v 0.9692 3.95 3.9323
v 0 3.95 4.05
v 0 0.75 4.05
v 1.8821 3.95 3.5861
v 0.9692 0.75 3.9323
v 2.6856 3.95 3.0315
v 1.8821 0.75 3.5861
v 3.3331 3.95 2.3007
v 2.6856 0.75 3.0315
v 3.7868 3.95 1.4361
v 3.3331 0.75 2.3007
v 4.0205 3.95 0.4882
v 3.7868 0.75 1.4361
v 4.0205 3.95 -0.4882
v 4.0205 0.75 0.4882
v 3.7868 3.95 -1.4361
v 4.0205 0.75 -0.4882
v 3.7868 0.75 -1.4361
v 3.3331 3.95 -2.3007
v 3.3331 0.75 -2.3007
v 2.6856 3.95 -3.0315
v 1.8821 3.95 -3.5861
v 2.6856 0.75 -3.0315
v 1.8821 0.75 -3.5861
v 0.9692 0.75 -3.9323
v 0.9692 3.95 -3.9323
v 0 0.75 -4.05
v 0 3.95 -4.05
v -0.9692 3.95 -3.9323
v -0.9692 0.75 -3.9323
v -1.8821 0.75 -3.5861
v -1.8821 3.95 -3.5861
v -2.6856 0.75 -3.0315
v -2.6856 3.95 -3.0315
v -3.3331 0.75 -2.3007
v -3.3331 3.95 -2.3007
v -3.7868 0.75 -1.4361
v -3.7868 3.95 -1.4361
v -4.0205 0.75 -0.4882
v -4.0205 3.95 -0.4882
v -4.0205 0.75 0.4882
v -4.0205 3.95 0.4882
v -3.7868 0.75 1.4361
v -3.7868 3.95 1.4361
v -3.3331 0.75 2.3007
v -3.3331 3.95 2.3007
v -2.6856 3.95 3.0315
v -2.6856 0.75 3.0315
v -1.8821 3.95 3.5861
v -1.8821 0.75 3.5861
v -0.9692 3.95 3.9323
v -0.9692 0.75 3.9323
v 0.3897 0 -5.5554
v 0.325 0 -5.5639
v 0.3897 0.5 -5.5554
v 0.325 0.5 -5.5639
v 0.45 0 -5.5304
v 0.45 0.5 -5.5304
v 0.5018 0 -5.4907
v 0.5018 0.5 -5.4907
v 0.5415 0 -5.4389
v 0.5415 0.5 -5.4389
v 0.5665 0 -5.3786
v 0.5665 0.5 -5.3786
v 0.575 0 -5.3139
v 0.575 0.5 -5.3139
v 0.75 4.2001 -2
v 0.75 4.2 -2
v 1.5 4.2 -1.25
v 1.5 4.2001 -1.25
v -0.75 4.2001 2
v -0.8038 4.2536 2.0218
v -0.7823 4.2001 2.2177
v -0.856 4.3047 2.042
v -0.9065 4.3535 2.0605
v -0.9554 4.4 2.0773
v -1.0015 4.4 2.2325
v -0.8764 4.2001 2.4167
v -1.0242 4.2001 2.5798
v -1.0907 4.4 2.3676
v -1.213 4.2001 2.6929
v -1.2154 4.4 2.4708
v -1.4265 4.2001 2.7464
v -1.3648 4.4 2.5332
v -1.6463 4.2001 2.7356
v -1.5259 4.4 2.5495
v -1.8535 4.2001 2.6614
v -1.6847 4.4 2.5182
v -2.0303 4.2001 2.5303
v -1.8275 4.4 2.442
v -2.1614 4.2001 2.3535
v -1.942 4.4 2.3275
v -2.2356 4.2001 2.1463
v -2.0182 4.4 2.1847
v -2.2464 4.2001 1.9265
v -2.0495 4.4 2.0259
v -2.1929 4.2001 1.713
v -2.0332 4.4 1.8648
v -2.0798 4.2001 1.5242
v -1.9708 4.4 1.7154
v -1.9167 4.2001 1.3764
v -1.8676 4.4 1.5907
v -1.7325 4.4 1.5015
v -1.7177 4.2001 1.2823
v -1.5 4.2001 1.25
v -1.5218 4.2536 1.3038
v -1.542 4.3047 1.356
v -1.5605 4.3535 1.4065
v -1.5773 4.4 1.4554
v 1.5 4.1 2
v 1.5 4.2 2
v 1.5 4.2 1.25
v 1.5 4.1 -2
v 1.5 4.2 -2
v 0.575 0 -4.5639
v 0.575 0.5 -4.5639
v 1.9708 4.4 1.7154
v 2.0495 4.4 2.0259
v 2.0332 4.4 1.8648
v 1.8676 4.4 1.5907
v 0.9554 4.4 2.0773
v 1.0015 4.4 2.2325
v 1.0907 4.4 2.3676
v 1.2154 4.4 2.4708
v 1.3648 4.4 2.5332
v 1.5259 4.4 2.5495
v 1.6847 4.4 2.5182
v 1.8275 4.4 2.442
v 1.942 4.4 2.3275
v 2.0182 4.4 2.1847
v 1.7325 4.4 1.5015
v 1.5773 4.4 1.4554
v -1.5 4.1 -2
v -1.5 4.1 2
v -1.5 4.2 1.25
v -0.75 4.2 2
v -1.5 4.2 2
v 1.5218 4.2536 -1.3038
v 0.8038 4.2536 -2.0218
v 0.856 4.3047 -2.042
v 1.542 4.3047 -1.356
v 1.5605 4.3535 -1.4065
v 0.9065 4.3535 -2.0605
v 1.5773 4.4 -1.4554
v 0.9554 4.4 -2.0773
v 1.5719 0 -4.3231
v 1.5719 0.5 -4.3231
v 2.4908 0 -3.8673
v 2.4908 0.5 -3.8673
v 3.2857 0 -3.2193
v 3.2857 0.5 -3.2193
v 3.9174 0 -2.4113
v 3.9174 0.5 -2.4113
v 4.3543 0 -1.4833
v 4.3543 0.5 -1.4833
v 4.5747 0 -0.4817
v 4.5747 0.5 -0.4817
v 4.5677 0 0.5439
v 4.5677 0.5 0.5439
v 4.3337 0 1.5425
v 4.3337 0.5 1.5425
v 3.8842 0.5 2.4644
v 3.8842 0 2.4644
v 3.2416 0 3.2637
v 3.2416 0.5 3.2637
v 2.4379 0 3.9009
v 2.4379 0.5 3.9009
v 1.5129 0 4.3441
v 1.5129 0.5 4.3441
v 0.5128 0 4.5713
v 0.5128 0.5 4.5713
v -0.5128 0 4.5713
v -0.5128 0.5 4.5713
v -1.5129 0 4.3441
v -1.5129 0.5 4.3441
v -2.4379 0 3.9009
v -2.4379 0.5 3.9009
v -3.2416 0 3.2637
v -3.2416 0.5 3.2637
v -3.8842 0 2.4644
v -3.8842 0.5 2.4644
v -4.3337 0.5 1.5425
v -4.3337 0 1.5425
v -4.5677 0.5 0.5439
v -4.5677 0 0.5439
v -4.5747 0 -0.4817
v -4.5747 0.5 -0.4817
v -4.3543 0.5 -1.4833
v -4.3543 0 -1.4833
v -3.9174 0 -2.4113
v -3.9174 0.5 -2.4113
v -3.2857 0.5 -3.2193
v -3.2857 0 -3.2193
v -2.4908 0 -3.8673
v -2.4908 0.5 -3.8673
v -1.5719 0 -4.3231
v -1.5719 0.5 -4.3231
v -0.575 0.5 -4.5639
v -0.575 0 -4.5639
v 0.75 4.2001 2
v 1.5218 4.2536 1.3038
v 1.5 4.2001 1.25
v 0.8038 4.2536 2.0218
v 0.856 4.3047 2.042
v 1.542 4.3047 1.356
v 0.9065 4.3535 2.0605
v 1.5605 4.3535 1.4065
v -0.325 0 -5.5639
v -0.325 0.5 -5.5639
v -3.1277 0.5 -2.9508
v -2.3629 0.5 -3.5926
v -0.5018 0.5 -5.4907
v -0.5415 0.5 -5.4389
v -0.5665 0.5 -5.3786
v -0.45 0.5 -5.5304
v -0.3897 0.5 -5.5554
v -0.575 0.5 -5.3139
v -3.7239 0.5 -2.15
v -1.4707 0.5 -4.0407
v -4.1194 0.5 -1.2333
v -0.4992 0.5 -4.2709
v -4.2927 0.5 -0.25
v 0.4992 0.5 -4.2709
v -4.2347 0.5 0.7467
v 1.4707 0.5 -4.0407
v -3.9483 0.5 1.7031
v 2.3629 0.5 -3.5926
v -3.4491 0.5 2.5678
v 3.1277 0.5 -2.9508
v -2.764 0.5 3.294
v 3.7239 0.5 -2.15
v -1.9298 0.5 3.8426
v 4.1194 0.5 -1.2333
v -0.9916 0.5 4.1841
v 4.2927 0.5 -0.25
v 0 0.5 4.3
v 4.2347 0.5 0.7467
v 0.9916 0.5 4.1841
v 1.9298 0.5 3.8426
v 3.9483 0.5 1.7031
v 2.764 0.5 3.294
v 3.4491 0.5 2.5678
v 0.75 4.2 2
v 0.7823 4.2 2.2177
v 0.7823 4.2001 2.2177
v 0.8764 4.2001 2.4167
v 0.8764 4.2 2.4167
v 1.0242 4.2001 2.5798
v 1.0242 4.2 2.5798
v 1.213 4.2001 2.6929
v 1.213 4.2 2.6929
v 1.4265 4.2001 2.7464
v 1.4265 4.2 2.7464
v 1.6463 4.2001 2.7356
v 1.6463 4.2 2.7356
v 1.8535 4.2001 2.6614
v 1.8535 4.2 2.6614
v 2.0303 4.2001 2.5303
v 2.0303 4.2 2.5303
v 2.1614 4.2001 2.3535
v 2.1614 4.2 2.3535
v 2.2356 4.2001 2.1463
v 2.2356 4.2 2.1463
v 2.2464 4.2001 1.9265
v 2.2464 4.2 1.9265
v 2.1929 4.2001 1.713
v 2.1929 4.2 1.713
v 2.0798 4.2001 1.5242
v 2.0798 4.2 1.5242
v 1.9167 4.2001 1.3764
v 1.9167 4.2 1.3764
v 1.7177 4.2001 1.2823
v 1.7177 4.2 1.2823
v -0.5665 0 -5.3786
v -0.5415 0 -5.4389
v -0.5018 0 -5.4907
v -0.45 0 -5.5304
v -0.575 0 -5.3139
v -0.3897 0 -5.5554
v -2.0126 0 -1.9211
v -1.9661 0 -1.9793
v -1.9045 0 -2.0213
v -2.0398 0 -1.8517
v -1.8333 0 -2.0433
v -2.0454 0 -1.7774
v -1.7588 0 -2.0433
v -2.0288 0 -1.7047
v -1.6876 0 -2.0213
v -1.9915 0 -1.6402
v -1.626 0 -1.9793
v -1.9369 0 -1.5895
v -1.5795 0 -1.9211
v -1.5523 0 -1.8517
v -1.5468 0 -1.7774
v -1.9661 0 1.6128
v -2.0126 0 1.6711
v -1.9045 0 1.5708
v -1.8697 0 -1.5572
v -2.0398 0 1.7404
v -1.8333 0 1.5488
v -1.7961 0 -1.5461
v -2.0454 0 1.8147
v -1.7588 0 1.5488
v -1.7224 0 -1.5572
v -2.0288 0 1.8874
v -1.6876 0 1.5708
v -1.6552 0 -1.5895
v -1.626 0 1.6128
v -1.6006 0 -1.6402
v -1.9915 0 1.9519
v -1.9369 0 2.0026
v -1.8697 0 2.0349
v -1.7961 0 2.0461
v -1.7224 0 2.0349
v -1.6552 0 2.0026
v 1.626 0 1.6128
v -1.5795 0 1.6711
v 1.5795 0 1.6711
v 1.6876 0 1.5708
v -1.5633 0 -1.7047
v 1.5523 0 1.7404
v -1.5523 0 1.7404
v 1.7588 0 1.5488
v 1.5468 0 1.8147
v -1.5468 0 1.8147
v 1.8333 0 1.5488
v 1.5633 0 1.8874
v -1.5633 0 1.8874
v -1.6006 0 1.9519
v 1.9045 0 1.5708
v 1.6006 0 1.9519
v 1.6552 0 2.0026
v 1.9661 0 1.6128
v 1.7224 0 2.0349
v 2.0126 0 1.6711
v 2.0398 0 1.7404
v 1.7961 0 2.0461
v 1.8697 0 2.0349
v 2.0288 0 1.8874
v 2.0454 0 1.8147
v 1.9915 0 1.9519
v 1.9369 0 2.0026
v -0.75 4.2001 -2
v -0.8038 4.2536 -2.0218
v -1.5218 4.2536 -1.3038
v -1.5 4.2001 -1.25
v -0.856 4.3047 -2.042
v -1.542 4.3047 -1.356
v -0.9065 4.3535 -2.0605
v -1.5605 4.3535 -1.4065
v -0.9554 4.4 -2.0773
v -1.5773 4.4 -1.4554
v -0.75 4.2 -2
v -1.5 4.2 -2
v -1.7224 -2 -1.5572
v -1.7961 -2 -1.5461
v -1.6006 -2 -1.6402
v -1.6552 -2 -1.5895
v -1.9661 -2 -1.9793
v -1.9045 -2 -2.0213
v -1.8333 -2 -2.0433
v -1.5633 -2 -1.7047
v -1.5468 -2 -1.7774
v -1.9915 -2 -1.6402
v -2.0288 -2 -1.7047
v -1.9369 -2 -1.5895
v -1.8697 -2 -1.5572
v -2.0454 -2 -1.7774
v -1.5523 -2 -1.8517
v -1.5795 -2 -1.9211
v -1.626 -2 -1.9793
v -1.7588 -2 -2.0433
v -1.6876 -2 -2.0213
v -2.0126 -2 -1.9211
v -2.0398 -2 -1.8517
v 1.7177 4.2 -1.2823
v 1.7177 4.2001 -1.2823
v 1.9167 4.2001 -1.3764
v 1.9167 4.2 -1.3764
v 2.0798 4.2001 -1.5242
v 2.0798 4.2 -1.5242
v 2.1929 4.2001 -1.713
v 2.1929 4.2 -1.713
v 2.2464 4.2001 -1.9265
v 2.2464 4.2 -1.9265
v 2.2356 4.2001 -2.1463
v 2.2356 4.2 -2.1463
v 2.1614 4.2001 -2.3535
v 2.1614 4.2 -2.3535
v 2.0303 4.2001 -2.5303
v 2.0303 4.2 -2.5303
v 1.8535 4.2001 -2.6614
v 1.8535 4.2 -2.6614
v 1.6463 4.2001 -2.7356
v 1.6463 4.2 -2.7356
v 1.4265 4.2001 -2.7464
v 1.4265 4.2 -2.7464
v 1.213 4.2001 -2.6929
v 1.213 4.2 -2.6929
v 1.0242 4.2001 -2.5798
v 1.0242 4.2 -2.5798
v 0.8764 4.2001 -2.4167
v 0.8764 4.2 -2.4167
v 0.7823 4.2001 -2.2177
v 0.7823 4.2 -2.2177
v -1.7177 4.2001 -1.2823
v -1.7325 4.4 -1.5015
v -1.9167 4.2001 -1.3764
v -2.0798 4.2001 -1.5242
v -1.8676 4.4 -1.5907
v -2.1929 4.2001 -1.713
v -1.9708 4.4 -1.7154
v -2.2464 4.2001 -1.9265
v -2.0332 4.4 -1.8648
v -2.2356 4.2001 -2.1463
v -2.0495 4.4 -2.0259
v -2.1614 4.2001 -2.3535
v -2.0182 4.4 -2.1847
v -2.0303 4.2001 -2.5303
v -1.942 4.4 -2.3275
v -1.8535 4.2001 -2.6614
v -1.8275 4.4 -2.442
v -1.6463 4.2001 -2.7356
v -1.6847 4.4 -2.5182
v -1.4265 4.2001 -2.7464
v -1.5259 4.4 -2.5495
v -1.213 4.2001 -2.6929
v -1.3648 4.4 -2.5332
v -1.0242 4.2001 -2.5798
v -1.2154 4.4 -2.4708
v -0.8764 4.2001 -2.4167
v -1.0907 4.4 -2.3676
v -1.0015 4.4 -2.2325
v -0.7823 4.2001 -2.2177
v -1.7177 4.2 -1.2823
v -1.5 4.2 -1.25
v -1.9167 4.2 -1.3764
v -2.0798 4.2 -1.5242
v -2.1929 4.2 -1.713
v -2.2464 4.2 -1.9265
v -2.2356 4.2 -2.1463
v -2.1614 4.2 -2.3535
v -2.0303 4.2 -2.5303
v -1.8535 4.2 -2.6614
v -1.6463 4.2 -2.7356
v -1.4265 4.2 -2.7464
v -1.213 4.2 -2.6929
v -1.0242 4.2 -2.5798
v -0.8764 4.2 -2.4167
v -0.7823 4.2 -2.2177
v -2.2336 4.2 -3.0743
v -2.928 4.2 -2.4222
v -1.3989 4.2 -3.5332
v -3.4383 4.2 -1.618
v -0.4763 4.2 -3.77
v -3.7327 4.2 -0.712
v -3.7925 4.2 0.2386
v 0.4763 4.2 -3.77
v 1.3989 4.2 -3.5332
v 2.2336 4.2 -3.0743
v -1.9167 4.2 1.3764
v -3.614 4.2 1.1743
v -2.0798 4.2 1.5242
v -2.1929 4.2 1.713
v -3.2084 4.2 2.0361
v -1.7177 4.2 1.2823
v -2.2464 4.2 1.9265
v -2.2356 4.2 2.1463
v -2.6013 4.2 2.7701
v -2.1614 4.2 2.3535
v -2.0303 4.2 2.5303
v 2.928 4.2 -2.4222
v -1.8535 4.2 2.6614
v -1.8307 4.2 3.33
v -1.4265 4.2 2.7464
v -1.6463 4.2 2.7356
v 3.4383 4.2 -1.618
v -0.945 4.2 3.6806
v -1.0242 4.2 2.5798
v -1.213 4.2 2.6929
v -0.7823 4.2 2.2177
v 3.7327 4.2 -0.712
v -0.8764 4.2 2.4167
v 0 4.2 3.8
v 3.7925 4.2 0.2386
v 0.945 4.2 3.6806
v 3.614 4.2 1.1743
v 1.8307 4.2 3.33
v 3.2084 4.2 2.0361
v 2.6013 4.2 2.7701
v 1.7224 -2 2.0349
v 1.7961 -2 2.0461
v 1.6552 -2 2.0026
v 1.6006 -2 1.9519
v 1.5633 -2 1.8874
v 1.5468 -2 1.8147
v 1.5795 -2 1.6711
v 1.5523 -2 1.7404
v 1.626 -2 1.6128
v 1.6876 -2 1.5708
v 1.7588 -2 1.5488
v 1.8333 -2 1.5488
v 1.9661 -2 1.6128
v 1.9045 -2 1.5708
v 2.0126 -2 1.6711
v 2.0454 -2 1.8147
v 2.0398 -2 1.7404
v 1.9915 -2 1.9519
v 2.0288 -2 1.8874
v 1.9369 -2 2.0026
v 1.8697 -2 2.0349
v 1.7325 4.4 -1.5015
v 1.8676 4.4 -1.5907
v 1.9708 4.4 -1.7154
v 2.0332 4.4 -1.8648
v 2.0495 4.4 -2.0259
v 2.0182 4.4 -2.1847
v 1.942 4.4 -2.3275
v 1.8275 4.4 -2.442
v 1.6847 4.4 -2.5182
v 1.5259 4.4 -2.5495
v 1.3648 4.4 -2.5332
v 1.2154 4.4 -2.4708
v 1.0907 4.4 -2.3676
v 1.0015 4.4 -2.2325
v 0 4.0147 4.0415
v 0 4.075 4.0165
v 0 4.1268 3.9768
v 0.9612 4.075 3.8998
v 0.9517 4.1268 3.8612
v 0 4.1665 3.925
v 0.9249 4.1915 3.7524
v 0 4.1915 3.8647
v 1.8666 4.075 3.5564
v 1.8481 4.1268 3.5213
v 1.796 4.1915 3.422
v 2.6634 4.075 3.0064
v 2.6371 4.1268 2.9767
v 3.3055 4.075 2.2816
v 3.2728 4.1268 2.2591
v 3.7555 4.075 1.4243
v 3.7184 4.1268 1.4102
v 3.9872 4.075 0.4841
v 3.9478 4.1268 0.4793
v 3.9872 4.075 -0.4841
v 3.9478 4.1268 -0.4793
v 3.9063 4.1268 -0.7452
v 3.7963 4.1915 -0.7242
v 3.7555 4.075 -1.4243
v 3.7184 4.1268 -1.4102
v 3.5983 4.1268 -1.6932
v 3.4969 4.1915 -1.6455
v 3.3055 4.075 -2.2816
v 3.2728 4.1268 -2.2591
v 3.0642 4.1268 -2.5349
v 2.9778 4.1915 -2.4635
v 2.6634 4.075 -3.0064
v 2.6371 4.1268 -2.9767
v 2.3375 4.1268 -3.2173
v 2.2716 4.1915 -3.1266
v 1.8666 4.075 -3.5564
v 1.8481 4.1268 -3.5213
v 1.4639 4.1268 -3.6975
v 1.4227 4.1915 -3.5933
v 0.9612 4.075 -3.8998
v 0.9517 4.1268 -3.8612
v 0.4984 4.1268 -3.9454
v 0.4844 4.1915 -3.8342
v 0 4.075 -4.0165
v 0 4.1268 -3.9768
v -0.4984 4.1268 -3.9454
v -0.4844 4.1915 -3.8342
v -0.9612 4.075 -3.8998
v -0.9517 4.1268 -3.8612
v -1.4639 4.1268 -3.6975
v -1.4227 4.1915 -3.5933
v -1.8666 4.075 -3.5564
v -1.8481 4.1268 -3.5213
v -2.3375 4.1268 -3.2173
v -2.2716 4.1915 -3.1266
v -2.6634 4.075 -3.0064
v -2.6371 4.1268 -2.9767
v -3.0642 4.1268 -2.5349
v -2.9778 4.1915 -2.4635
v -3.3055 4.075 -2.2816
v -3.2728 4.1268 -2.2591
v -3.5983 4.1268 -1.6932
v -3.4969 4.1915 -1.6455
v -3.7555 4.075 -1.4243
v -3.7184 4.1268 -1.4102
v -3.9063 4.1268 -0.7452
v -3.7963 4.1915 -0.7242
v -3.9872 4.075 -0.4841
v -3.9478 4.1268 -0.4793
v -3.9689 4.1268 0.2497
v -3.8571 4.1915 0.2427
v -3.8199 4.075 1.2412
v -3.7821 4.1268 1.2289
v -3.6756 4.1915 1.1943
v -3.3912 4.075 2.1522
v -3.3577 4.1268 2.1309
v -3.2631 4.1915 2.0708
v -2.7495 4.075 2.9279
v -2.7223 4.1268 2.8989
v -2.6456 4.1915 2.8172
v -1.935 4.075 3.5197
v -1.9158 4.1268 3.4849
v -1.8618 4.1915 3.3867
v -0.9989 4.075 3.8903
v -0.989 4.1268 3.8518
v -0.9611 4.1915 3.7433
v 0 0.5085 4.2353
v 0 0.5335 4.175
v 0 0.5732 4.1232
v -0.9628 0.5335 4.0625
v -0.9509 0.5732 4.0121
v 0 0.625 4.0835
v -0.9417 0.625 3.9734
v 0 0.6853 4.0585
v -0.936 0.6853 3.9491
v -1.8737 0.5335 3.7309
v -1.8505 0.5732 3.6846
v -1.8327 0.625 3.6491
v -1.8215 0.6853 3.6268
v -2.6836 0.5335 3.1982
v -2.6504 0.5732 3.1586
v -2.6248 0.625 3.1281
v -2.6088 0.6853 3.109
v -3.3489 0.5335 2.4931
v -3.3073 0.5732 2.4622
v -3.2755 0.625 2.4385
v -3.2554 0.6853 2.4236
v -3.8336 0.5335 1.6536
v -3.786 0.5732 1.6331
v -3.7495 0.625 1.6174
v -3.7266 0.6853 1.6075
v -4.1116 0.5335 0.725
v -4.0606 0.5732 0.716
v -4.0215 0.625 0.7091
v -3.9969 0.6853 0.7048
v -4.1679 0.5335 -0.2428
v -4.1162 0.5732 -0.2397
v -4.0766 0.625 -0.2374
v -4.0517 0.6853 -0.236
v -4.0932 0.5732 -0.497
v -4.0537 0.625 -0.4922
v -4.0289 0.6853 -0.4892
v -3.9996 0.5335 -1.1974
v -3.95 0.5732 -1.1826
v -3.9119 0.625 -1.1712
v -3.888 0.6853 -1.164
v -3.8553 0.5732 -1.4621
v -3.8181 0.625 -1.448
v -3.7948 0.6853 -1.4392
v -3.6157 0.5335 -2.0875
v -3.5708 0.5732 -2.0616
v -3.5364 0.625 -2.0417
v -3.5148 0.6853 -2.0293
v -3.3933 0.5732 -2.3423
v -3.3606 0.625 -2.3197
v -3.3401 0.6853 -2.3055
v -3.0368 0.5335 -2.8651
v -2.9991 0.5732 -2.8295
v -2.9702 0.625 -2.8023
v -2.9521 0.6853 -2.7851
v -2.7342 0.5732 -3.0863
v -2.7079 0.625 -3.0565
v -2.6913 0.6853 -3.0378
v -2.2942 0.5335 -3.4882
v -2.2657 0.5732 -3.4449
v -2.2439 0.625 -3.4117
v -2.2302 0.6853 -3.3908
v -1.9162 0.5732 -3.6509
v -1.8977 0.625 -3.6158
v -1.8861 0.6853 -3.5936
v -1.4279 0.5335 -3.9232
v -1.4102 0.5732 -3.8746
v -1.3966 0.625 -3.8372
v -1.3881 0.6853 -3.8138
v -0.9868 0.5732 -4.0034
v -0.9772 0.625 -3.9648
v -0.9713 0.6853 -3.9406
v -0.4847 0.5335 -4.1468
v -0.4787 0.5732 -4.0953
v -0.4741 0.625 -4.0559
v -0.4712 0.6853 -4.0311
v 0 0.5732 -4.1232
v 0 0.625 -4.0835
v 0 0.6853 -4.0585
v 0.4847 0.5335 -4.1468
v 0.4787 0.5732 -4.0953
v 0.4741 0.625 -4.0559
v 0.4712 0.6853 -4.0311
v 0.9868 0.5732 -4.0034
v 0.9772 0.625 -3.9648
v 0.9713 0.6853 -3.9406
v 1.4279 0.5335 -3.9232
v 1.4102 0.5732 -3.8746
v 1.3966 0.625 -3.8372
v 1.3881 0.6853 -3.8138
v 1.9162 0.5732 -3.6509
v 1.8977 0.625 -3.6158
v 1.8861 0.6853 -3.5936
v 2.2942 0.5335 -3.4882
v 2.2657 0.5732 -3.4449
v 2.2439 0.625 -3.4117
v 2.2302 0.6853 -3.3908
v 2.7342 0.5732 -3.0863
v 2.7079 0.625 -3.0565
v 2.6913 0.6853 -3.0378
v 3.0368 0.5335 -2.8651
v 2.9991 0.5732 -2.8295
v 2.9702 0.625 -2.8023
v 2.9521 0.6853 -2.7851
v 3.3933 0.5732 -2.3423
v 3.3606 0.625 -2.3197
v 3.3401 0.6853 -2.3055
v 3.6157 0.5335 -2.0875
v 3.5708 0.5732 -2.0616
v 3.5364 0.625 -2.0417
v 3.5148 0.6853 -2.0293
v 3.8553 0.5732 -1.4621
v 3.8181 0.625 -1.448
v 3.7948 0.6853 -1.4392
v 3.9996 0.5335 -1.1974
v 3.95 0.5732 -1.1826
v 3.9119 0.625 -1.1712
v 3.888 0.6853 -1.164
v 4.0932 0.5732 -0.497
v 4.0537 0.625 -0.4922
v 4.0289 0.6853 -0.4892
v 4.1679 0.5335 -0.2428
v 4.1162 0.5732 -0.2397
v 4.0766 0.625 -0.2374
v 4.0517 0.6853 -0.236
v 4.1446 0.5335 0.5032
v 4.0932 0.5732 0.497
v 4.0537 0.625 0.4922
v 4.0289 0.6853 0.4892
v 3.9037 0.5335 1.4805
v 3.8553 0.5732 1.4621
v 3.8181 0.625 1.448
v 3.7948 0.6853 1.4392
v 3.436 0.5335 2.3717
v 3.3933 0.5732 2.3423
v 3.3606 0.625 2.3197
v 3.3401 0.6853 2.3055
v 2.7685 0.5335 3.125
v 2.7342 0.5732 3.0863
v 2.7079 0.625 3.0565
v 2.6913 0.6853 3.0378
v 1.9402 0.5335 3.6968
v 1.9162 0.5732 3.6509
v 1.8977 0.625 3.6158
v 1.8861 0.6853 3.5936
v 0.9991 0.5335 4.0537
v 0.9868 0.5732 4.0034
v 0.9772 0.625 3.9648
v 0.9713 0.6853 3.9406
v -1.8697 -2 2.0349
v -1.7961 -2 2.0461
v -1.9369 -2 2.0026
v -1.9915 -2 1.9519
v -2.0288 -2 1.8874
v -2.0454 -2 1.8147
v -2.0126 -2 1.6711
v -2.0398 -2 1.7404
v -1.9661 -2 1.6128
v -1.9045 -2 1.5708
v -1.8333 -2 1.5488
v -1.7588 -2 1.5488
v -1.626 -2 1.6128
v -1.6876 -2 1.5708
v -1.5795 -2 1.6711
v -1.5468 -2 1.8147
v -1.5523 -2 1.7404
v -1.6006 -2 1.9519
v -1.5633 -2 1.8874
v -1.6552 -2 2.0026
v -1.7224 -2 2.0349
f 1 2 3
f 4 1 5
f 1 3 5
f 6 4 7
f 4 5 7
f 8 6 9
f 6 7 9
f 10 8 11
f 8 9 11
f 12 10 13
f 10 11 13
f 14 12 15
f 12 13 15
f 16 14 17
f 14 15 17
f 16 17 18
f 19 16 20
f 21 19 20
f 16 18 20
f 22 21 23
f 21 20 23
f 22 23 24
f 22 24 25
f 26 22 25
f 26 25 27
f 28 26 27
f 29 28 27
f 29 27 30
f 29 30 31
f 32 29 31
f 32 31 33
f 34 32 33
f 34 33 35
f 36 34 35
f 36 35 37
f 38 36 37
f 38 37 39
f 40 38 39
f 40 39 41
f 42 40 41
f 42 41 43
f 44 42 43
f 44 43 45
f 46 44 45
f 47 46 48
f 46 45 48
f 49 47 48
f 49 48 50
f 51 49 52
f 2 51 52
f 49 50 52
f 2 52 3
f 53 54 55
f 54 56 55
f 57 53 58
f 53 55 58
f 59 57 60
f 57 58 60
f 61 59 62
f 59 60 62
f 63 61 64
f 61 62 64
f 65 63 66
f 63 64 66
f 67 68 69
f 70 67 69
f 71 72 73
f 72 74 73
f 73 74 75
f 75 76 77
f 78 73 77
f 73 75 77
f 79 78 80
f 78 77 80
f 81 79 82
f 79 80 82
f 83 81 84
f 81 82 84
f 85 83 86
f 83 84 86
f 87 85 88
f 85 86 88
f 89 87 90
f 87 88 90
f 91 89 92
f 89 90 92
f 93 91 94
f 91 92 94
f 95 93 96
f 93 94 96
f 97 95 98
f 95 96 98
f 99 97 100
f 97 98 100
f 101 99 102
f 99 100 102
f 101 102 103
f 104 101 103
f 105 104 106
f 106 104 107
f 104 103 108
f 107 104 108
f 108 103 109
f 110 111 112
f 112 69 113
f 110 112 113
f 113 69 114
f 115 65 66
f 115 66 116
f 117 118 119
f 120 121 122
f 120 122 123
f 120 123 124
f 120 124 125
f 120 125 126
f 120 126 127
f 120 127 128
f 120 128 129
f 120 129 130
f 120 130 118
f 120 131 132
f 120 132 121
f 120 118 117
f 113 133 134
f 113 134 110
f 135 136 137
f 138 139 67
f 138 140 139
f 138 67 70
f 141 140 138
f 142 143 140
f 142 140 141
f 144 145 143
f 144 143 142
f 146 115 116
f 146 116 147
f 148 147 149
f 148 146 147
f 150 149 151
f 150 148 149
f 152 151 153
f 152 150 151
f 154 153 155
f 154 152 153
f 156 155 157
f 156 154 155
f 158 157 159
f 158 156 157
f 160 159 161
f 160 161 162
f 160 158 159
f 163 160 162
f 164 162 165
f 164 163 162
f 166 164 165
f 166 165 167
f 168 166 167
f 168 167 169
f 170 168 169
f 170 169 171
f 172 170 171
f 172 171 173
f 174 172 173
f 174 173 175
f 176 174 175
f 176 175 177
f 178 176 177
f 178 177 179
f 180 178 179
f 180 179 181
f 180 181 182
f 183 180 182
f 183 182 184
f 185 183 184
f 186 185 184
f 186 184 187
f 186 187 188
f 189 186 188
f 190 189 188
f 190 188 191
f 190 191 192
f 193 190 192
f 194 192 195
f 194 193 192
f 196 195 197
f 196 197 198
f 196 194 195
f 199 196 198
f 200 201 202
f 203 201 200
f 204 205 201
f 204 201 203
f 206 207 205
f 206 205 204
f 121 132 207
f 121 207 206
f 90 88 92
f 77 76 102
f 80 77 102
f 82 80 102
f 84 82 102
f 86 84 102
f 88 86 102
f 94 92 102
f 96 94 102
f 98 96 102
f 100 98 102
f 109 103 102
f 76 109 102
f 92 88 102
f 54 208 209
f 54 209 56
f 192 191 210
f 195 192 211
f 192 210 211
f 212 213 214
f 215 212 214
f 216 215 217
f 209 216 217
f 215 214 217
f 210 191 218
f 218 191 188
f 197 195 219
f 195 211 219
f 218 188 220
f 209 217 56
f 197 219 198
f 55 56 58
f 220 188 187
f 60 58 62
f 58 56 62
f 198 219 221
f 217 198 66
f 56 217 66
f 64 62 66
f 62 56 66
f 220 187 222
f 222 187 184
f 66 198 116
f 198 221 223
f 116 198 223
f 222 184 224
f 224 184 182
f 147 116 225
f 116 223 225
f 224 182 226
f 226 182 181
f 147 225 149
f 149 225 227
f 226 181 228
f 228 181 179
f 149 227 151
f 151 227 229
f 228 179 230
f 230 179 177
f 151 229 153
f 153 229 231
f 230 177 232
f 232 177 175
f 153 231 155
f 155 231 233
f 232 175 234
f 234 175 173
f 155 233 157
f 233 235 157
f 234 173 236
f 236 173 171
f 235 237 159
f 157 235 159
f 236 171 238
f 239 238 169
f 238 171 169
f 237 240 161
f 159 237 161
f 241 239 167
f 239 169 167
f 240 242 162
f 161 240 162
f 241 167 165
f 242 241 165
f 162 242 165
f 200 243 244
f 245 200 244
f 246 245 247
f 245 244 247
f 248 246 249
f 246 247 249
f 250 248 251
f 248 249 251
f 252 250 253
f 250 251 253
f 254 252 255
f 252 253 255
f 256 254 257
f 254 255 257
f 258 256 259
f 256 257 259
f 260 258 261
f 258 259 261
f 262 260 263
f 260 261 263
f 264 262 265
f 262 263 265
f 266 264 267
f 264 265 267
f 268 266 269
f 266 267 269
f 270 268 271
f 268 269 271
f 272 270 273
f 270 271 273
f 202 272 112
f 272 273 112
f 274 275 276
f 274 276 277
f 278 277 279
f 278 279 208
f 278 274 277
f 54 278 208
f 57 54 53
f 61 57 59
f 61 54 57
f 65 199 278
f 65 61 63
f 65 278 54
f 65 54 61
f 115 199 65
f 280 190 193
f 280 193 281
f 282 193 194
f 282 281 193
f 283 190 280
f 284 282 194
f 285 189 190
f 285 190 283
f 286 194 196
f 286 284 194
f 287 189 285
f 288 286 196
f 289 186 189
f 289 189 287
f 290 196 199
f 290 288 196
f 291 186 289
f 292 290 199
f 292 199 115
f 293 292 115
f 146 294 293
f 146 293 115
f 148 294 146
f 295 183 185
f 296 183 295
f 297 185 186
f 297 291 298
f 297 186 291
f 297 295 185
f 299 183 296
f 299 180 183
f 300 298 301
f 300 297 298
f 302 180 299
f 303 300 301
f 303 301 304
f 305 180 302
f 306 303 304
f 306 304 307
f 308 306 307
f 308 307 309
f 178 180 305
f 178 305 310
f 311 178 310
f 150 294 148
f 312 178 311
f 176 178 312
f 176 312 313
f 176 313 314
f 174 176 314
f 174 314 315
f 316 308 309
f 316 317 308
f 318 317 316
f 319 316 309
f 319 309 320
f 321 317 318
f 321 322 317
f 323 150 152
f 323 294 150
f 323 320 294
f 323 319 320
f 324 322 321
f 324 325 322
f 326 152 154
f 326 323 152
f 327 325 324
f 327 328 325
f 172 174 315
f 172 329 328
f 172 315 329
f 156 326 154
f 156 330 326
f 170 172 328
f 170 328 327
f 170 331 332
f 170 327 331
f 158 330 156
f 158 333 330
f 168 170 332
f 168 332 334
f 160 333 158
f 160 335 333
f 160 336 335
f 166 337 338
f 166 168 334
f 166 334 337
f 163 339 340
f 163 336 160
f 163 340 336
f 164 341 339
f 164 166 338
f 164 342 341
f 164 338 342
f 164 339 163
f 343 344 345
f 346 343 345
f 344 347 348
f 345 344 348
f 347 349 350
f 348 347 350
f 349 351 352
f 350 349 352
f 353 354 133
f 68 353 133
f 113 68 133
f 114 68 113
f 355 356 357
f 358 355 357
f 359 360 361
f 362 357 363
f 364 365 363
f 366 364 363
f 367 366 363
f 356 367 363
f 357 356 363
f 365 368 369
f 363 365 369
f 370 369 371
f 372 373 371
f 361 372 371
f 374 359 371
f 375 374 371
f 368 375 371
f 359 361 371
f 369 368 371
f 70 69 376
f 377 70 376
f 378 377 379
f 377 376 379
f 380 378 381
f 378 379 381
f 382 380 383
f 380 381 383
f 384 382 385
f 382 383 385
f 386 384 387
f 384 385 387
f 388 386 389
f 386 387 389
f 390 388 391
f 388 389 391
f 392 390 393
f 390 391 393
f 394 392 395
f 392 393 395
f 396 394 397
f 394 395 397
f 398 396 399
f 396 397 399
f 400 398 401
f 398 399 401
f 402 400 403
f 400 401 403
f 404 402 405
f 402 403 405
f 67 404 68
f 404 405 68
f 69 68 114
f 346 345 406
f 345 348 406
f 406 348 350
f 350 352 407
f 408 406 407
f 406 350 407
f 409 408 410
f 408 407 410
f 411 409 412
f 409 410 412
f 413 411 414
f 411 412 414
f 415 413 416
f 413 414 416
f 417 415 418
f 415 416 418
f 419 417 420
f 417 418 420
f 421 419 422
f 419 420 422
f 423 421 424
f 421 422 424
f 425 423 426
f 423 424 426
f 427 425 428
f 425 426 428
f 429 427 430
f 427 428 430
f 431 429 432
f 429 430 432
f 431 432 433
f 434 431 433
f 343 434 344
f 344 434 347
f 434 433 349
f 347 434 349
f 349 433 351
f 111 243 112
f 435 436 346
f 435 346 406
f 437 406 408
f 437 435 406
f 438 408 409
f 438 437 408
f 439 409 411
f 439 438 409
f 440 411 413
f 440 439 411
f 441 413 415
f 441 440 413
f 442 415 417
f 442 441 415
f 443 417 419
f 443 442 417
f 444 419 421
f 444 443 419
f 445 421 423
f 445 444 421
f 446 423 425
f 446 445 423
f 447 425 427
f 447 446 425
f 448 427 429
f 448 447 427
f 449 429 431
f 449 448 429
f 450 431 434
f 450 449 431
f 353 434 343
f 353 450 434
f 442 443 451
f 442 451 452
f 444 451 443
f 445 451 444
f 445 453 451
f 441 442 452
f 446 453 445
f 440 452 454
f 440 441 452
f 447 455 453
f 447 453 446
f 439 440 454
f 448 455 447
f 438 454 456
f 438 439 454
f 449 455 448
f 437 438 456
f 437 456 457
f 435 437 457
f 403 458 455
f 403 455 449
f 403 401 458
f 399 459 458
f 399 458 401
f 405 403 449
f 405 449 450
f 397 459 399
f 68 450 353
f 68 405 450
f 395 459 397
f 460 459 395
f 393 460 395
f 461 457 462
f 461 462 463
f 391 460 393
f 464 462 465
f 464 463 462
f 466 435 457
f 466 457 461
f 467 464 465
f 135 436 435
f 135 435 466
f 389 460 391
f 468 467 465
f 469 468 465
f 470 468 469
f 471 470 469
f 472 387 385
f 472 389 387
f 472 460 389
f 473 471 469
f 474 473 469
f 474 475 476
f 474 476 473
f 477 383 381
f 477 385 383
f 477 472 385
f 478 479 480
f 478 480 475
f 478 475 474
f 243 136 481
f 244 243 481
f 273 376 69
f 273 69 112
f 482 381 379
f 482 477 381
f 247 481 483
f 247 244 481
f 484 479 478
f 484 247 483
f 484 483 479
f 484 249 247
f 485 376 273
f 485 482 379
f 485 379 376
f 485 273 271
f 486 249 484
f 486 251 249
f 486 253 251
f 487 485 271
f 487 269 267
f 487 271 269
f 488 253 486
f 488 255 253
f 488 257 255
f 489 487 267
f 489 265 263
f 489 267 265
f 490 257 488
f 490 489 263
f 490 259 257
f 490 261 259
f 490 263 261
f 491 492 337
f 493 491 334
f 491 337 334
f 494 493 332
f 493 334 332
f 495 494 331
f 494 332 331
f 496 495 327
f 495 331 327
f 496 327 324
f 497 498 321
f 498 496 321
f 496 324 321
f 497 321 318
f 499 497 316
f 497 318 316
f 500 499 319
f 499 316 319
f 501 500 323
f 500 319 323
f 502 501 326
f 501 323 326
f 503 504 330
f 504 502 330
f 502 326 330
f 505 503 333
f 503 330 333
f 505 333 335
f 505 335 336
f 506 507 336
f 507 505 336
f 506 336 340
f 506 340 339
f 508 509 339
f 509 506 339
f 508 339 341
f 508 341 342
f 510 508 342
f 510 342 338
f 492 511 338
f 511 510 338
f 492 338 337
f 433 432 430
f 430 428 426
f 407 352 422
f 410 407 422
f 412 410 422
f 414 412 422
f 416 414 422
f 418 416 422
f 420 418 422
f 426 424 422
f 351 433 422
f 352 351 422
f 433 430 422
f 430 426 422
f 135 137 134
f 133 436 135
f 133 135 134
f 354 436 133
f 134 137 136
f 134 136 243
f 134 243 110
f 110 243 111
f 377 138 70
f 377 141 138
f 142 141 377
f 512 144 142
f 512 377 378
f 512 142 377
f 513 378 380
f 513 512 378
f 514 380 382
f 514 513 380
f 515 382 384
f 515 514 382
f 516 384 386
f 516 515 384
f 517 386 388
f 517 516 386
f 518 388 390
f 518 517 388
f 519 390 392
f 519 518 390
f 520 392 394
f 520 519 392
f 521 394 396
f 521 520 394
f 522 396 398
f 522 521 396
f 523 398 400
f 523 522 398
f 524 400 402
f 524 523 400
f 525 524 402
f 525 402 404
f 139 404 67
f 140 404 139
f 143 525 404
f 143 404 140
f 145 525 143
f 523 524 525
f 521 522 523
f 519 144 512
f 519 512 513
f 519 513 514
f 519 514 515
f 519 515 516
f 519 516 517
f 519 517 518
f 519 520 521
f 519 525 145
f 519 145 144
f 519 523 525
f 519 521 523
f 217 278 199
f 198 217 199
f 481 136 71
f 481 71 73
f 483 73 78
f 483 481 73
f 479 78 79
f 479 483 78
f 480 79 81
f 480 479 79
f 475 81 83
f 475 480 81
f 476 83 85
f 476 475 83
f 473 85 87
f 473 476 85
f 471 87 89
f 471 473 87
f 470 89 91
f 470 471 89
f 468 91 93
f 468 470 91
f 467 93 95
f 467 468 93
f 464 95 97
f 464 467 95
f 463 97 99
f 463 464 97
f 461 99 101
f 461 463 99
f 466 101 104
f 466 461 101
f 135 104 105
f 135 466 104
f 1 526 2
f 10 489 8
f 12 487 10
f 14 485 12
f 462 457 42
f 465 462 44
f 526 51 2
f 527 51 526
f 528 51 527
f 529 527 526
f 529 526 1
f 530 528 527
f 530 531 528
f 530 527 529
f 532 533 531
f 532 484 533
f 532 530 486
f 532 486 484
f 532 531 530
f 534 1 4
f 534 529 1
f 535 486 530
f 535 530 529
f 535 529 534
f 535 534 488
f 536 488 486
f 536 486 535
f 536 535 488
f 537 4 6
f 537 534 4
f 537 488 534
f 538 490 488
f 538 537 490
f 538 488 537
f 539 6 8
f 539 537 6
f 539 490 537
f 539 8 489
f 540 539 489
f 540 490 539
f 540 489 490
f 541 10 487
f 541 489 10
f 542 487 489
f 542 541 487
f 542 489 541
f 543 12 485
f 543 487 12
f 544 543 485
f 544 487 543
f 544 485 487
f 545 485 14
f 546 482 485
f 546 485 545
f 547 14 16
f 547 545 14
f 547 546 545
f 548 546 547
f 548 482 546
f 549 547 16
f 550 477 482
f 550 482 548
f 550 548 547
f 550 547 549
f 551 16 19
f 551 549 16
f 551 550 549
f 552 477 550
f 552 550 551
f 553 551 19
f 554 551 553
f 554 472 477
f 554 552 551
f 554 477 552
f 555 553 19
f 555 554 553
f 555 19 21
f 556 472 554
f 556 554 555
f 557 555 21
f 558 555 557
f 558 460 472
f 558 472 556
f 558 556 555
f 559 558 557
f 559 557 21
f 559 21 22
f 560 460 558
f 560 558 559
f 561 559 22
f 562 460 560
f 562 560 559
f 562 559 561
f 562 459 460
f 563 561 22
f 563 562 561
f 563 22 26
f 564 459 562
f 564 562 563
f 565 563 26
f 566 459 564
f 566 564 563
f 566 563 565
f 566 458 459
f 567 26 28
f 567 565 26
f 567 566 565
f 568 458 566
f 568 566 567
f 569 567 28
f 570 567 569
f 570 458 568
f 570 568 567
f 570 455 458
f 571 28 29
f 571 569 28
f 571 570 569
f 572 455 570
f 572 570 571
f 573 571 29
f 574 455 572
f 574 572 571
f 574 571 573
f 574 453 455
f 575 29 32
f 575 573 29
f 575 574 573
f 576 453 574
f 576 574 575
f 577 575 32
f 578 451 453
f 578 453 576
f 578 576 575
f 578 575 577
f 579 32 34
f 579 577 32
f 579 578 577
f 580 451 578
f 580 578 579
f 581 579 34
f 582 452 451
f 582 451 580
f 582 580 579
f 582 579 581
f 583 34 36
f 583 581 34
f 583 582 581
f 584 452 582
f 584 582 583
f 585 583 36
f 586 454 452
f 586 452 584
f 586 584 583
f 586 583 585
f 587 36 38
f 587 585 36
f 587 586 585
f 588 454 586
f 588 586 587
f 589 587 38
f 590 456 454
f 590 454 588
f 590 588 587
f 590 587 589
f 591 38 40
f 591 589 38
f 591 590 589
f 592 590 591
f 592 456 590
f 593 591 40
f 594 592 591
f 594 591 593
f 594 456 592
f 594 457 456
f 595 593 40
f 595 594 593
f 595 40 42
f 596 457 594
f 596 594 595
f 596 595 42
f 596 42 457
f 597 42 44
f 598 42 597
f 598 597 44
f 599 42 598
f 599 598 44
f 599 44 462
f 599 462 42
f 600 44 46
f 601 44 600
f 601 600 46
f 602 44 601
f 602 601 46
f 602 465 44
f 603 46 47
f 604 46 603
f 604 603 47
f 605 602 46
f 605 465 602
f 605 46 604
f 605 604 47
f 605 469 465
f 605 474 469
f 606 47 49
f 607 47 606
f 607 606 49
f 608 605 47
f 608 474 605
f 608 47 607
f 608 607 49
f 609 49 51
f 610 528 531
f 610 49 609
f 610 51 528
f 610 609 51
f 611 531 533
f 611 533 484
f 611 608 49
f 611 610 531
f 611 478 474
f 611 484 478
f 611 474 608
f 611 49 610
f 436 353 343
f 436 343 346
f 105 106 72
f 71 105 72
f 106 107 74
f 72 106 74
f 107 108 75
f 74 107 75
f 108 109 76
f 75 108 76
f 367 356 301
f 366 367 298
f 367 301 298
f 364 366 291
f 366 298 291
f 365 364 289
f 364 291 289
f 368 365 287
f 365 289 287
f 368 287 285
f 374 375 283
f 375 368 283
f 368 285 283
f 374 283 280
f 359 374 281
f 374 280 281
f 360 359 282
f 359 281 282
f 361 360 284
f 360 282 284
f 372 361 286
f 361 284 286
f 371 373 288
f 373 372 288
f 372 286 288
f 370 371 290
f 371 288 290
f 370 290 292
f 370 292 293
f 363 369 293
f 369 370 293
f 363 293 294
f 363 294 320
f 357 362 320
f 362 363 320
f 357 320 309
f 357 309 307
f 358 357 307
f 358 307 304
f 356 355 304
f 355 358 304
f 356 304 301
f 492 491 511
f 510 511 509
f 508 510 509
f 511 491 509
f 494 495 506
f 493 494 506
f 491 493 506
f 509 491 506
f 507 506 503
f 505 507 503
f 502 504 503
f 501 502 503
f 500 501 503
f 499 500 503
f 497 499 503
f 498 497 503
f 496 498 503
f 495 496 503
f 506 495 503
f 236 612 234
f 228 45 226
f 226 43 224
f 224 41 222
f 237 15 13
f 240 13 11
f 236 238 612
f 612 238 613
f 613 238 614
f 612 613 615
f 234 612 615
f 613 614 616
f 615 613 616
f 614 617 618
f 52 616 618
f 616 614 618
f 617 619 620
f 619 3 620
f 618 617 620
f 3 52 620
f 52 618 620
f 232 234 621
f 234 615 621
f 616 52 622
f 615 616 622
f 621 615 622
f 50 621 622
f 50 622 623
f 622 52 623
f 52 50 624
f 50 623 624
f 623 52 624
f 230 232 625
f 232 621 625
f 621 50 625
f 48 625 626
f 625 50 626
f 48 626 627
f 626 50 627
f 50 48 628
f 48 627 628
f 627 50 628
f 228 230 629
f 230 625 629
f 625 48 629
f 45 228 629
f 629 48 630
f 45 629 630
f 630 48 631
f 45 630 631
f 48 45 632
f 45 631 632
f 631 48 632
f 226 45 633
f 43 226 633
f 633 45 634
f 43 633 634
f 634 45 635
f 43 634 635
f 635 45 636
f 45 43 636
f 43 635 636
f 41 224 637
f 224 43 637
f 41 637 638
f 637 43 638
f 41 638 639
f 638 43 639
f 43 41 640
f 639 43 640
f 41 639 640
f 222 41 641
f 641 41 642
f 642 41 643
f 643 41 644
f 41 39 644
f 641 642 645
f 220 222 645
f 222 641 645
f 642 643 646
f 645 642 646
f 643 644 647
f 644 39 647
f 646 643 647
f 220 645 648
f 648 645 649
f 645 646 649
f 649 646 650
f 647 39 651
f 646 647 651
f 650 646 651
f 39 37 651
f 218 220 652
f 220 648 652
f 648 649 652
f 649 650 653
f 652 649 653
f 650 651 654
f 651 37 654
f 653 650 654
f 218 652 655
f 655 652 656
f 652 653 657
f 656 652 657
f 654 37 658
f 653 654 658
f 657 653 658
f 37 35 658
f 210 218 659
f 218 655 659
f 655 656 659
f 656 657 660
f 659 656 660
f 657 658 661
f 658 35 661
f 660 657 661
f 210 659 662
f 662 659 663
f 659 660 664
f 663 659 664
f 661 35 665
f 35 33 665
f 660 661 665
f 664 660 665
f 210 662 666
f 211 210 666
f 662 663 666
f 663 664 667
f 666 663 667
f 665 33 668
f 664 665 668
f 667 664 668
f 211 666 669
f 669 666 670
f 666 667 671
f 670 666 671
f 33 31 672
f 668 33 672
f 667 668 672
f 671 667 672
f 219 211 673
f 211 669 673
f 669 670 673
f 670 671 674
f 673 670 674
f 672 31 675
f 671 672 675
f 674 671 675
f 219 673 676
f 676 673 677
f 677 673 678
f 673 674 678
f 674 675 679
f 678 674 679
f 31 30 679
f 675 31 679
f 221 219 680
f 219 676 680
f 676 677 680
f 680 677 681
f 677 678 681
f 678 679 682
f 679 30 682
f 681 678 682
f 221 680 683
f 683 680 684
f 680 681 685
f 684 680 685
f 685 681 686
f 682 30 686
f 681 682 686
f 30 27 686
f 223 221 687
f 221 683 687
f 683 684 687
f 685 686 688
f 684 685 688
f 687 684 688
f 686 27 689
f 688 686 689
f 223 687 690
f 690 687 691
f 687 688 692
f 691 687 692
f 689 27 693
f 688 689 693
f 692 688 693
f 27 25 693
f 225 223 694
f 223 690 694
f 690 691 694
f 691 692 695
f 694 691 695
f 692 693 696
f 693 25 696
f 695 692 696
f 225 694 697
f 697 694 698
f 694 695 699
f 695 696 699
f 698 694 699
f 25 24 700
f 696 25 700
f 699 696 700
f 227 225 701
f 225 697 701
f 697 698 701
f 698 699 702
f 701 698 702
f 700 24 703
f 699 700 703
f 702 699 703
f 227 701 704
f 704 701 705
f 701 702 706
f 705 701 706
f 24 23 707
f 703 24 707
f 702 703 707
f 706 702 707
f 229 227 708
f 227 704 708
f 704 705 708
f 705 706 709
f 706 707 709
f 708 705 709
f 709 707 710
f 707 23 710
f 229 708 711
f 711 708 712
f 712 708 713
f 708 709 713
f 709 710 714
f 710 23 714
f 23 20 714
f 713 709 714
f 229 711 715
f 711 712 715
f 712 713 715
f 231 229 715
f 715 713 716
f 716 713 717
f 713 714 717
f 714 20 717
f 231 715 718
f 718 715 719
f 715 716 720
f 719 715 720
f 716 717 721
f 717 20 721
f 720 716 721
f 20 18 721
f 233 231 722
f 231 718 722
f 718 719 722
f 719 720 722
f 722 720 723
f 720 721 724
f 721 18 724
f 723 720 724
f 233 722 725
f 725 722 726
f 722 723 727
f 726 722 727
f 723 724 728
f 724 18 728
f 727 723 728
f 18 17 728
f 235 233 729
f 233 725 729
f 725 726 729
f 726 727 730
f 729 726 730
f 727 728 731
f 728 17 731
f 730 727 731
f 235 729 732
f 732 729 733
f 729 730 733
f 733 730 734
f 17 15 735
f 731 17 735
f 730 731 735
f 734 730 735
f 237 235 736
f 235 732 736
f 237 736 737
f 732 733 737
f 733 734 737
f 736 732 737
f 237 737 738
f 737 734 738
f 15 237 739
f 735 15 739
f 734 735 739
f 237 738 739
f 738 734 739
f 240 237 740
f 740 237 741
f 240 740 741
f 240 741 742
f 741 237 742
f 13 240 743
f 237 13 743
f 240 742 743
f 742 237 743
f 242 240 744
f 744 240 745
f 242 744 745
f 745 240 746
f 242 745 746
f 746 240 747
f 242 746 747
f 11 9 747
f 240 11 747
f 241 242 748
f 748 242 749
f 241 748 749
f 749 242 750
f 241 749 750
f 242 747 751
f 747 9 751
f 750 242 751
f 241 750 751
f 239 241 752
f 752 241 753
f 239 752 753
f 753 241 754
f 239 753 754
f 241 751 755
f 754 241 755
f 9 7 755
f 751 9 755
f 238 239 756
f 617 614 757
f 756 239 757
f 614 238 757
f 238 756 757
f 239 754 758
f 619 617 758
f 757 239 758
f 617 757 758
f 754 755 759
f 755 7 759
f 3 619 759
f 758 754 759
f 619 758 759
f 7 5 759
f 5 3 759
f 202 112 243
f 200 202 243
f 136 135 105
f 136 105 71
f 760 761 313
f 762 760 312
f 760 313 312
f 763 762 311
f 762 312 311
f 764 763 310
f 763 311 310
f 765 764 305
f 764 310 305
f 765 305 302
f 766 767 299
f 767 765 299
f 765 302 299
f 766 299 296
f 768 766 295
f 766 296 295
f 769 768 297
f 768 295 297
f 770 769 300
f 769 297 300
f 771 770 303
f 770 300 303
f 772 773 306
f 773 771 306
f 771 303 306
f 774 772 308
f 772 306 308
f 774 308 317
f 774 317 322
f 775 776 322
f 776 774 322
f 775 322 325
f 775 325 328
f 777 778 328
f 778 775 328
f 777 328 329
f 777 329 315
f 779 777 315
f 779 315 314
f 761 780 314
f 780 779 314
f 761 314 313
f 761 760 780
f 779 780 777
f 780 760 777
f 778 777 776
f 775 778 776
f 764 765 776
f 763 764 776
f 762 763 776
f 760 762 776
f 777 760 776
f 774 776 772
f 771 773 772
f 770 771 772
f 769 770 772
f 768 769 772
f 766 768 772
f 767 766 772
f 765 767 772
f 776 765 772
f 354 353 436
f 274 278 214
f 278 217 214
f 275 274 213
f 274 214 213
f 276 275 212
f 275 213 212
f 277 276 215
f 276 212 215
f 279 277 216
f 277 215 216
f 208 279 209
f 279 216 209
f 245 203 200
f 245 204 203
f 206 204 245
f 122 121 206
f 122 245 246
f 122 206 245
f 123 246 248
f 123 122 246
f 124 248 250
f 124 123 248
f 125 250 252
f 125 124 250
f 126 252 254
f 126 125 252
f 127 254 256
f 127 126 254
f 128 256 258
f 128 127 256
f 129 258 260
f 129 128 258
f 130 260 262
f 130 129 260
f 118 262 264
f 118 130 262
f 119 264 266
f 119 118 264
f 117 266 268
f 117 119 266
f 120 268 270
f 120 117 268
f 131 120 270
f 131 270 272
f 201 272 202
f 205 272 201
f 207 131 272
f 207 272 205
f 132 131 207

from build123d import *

# Parameters (mm, degrees)
SKETCH1_R                   = 4.05
BASE_EXTRUSION_DEPTH        = 4.2
SKETCH2_W                   = 3
SKETCH2_H                   = 4
WINDOW_DEPTH                = 0.1
WINDOW_BUMPS_DEPTH          = 0.2
WINDOW_BUMPS_CHAMFERS_SIZE  = 0.2
SKETCH3_R                   = 4.6
FLANGE_DEPTH                = 0.5
SKETCH5_W                   = 1.15
SKETCH5_H                   = 1
HORIZONTAL_FLANGE_TAB_DEPTH = 0.5
ROUNDS_AND_FILLETS_R        = 0.25
SKETCH4_R                   = 0.25
LEADS_DEPTH                 = 13.2


with BuildPart() as part:
    # Sketch1 → Base Extrusion (new body)
    with BuildSketch(Plane(origin=(0, 0, 0), x_dir=(1, 0, 0), z_dir=(0, 1, 0))):
        with Locations(Location((0, 0, 0), (0, 0, 270))):
            Circle(SKETCH1_R)
    extrude(amount=BASE_EXTRUSION_DEPTH)

    # Sketch2 → Window (cut)
    with BuildSketch(Plane(origin=(0, 4.2, 0), x_dir=(1, 0, 0), z_dir=(0, 1, 0))):
        Rectangle(SKETCH2_W, SKETCH2_H)
    extrude(amount=-WINDOW_DEPTH, mode=Mode.SUBTRACT)

    # Sketch6 → Window Bumps (add)
    with BuildSketch(Plane(origin=(0, 4.2, 0), x_dir=(1, 0, 0), z_dir=(0, 1, 0))):
        with BuildLine():
            Line((-0.75, 2), (-1.5, 1.25))
            ThreePointArc((-1.5, 1.25), (-2.030330086, 2.530330086), (-0.75, 2))
        make_face()
        with BuildLine():
            Line((0.75, 2), (1.5, 1.25))
            ThreePointArc((1.5, 1.25), (2.030330086, 2.530330086), (0.75, 2))
        make_face()
        with BuildLine():
            Line((1.5, -1.25), (0.75, -2))
            ThreePointArc((0.75, -2), (2.030330086, -2.530330086), (1.5, -1.25))
        make_face()
        with BuildLine():
            Line((-1.5, -1.25), (-0.75, -2))
            ThreePointArc((-0.75, -2), (-2.030330086, -2.530330086), (-1.5, -1.25))
        make_face()
    extrude(amount=WINDOW_BUMPS_DEPTH)

    # Window Bumps Chamfers
    window_bumps_chamfers_edges = [part.edges().sort_by_distance(p)[0] for p in [
        (-2.030330086, 4.4, 2.530330086),
        (2.030330086, 4.4, 2.530330086),
        (2.030330086, 4.4, -2.530330086),
        (-2.030330086, 4.4, -2.530330086),
        (-1.125, 4.4, 1.625),
        (1.125, 4.4, 1.625),
        (1.125, 4.4, -1.625),
        (-1.125, 4.4, -1.625),
    ]]
    chamfer(window_bumps_chamfers_edges, length=WINDOW_BUMPS_CHAMFERS_SIZE - 0.0001)  # a hair under: the kernel refuses the full size

    # Sketch3 → Flange (add)
    with BuildSketch(Plane.XZ):
        with Locations(Location((0, 0, 0), (0, 0, 270))):
            Circle(SKETCH3_R)
    extrude(amount=-FLANGE_DEPTH)

    # Sketch5 → Horizontal Flange Tab (add)
    with BuildSketch(Plane.XZ):
        with Locations((0, -5.063921012)):
            Rectangle(SKETCH5_W, SKETCH5_H)
    extrude(amount=-HORIZONTAL_FLANGE_TAB_DEPTH)

    # Rounds and Fillets
    rounds_and_fillets_edges = [part.edges().sort_by_distance(p)[0] for p in [
        (0, 4.2, -4.05),
        (0, 0.5, -4.05),
        (-0.575, 0.25, -5.563921012),
        (0.575, 0.25, -5.563921012),
    ]]
    fillet(rounds_and_fillets_edges, radius=ROUNDS_AND_FILLETS_R)

    # Sketch4 → Leads (add)
    with BuildSketch(Plane.XZ):
        with Locations(Location((-1.796051224, -1.796051224, 0), (0, 0, 90))):
            Circle(SKETCH4_R)
        with Locations(Location((1.796051224, 1.796051224, 0), (0, 0, 90))):
            Circle(SKETCH4_R)
        with Locations(Location((-1.796051224, 1.796051224, 0), (0, 0, 90))):
            Circle(SKETCH4_R)
    extrude(amount=LEADS_DEPTH)

    # Leads Trim
    split(bisect_by=Plane(origin=(0, -2, 0), x_dir=(1, 0, 0), z_dir=(0, 1, 0)), keep=Keep.TOP)


solid = part.part
